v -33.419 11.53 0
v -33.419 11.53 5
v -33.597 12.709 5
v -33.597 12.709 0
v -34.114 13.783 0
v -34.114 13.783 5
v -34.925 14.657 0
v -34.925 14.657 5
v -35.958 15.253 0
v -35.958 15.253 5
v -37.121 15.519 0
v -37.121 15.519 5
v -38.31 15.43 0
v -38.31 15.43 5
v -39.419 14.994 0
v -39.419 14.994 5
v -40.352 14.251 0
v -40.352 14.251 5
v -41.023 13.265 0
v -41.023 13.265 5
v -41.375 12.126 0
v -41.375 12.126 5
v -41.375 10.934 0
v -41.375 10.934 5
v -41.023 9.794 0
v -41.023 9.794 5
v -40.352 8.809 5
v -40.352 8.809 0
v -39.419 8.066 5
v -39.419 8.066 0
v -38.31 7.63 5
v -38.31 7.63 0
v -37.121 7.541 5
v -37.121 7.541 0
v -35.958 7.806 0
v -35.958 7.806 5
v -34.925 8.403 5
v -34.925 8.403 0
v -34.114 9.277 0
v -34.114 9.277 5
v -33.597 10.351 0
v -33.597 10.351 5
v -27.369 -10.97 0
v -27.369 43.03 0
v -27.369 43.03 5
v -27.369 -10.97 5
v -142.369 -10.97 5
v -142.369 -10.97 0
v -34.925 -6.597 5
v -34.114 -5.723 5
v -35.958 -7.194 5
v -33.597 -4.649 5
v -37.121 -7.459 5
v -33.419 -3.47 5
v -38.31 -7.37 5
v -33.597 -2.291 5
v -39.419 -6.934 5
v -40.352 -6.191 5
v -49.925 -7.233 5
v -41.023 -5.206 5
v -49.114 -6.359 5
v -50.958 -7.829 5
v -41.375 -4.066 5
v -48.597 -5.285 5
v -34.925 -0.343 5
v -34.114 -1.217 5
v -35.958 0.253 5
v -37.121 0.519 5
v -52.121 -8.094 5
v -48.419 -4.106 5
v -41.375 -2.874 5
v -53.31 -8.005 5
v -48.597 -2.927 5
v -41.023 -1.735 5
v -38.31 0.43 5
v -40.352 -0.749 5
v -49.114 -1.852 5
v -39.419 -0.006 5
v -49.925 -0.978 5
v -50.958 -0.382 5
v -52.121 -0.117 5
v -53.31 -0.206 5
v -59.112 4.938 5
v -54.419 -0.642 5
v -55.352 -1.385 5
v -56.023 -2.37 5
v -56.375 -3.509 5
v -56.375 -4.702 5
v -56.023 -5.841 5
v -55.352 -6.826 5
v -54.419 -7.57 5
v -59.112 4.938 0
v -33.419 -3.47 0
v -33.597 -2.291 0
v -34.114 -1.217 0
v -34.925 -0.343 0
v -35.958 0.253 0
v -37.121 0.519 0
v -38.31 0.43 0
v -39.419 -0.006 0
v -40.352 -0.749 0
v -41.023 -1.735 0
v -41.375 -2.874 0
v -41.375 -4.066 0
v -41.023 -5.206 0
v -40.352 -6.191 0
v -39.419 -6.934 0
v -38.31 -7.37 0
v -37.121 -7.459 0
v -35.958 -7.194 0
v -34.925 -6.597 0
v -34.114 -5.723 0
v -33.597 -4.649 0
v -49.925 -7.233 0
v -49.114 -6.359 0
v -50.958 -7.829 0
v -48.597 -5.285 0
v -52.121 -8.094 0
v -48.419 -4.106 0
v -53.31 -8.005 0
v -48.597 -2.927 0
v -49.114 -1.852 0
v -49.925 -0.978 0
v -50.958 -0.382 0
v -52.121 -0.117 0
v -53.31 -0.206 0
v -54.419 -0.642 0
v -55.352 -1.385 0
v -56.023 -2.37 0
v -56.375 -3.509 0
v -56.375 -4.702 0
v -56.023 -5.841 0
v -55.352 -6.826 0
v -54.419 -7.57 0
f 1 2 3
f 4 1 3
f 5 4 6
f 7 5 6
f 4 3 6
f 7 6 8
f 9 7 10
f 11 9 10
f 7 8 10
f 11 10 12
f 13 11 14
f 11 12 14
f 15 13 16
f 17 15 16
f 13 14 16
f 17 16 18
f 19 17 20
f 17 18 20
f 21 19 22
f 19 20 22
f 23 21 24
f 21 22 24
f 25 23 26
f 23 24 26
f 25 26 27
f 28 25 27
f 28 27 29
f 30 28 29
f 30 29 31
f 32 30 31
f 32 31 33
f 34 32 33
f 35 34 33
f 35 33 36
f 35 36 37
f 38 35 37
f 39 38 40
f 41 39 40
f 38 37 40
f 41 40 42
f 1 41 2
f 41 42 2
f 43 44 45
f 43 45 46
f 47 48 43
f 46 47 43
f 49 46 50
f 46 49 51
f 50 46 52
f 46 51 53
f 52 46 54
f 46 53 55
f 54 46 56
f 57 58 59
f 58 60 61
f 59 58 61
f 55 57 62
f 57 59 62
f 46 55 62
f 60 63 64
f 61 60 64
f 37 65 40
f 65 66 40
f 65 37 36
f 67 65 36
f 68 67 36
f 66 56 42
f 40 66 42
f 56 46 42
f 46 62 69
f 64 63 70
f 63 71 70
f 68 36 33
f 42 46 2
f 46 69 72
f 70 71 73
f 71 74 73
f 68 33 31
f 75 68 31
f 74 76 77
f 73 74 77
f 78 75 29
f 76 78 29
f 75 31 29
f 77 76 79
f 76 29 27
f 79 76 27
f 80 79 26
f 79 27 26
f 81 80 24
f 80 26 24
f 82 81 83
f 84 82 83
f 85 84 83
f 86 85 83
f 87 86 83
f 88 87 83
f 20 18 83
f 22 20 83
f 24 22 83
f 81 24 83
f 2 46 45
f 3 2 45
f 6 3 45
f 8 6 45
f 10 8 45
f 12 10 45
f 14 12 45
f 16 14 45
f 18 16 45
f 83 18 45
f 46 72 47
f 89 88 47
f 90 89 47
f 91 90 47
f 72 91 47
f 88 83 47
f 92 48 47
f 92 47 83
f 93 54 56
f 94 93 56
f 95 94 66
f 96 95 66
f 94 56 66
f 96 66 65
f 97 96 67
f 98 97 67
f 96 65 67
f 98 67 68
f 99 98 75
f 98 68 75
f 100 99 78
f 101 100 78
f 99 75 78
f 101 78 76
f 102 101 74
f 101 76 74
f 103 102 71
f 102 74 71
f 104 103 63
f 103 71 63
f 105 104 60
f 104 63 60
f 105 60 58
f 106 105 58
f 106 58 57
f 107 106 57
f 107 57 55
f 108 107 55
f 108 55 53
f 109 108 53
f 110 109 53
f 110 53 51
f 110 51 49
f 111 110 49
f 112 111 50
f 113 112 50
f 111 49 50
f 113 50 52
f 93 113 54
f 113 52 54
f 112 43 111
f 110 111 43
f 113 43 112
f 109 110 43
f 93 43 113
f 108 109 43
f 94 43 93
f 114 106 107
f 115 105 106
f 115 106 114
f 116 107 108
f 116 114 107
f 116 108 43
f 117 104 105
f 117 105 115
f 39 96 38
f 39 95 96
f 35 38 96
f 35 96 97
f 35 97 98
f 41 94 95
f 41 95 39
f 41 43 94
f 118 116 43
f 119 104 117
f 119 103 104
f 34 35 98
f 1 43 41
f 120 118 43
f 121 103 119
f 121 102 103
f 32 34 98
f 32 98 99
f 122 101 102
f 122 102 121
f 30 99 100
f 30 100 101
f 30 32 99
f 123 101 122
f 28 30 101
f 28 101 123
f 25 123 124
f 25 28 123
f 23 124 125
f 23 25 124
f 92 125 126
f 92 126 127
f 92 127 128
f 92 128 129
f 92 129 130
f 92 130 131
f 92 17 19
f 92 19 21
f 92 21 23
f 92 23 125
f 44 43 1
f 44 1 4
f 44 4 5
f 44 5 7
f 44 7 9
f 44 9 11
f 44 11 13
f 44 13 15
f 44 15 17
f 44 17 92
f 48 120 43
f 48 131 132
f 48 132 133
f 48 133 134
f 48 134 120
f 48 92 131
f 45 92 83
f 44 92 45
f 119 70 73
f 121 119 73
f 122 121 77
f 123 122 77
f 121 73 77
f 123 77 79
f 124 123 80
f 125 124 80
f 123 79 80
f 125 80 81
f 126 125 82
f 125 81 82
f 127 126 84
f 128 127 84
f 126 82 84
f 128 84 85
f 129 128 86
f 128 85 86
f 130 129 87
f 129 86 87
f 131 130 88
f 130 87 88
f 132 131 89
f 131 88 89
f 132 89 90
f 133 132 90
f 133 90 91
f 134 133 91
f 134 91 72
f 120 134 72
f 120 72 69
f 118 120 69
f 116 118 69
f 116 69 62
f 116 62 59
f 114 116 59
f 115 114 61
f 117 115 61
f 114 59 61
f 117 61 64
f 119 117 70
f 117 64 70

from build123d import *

# Parameters (mm, degrees)
BOSS_EXTRUDE1_DEPTH = 5
SKETCH2_R           = 4
CUT_EXTRUDE1_DEPTH  = 5


with BuildPart() as part:
    # Sketch1 → Boss-Extrude1 (new body)
    with BuildSketch(Plane.XY):
        Polygon((-27.36941191, 43.029850731), (-27.36941191, -10.970149254), (-72.36941191, -10.970149254), (-142.36941191, -10.970149254), (-59.112279179, 4.938410019), align=None)
    extrude(amount=BOSS_EXTRUDE1_DEPTH)

    # Sketch2 → Cut-Extrude1 (cut)
    with BuildSketch(Plane.XY.offset(5)):
        with Locations((-37.419438967, -3.470149254)):
            Circle(SKETCH2_R)
        with Locations((-37.419438967, 11.529850746)):
            Circle(SKETCH2_R)
        with Locations((-52.419438967, -4.105668706)):
            Circle(SKETCH2_R)
    extrude(amount=-CUT_EXTRUDE1_DEPTH, mode=Mode.SUBTRACT)


solid = part.part
